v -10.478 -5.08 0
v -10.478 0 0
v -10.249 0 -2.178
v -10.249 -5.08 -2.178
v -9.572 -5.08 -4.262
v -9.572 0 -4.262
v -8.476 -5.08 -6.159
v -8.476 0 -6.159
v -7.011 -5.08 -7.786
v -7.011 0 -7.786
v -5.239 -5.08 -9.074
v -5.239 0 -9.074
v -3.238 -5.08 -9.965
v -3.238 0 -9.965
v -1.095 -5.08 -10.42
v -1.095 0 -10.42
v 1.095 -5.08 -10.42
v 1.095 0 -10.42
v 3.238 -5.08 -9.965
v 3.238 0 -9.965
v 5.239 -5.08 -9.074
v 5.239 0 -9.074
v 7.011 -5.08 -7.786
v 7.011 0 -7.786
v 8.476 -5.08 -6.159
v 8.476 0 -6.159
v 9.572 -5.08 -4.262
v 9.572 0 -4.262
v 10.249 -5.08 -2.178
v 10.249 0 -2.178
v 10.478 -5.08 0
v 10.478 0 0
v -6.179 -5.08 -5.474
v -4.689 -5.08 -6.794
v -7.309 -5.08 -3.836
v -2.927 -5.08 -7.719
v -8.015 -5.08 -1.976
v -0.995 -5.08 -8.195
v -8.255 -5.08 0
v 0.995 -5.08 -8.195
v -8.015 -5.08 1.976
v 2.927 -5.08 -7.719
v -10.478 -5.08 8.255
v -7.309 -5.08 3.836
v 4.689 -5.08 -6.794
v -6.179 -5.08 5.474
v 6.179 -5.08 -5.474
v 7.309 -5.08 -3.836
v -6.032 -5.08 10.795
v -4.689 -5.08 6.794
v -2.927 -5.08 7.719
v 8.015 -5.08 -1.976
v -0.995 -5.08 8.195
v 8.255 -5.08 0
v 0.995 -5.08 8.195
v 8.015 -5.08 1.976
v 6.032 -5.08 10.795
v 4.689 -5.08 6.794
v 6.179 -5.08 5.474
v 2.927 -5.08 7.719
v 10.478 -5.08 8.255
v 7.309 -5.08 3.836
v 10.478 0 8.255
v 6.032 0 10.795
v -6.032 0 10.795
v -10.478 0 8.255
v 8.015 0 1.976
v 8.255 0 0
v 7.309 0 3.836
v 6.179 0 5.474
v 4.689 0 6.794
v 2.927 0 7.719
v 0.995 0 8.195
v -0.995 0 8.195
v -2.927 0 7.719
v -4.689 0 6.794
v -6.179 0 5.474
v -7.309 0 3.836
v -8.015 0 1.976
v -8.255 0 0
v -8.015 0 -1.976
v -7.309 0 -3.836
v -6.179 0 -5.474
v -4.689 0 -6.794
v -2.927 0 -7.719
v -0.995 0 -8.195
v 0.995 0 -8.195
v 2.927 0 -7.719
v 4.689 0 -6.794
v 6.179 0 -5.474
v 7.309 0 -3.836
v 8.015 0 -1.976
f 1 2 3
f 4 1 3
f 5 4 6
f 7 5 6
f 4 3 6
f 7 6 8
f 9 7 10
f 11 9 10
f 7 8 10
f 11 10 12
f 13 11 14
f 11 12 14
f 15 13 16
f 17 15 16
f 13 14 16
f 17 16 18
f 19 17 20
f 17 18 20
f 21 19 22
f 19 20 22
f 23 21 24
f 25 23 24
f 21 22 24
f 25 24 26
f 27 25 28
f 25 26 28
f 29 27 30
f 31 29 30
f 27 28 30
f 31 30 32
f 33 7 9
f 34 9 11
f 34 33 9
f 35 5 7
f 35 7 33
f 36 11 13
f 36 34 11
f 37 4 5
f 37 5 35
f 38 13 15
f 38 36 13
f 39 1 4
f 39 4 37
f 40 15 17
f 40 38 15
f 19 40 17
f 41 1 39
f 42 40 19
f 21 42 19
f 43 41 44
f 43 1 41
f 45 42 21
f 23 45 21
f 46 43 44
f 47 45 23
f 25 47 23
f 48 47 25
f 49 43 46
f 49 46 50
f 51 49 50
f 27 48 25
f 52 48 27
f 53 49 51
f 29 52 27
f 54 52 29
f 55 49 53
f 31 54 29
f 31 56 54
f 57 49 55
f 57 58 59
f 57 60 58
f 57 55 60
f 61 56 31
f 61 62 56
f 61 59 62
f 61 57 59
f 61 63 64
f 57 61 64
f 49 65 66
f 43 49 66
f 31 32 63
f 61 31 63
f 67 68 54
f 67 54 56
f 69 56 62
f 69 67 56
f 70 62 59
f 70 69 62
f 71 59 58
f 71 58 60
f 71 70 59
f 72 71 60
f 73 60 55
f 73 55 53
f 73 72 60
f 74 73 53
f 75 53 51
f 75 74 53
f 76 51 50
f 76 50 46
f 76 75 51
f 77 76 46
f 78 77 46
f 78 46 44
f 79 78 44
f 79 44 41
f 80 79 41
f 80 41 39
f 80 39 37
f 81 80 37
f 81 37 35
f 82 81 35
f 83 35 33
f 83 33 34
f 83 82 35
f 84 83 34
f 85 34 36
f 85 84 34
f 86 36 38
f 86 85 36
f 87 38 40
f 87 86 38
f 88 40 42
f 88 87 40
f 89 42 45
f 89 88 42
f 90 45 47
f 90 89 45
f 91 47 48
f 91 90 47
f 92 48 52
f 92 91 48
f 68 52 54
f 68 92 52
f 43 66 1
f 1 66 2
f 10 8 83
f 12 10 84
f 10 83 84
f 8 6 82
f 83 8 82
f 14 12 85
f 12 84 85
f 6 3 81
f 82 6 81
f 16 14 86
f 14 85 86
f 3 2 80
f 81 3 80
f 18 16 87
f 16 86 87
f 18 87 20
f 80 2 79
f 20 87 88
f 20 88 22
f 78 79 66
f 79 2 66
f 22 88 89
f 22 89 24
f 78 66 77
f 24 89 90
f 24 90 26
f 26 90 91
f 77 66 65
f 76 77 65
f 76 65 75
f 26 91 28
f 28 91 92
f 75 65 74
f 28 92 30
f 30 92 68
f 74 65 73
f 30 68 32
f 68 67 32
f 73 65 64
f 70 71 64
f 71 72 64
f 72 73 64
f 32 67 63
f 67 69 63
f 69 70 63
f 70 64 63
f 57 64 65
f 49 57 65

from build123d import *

# Parameters (mm, degrees)
F0_R     = 8.255
F1_DEPTH = 5.08


with BuildPart() as f1:
    # F0 (on Front) → F1 (new body)
    with BuildSketch(Plane.XZ):
        with BuildLine():
            ThreePointArc((-10.4775, 0), (0, 10.4775), (10.4775, 0))
            Line((10.4775, 0), (10.4775, 8.255))
            Line((10.4775, 8.255), (6.0325, 10.795))
            Line((6.0325, 10.795), (-6.0325, 10.795))
            Line((-6.0325, 10.795), (-10.4775, 8.255))
            Line((-10.4775, 8.255), (-10.4775, 0))
        make_face()
        with BuildLine():
            ThreePointArc((-10.4775, 0), (0, -10.4775), (10.4775, 0))
            ThreePointArc((10.4775, 0), (0, 10.4775), (-10.4775, 0))
        make_face()
        Circle(F0_R, mode=Mode.SUBTRACT)
    extrude(amount=F1_DEPTH)


solid = f1.part
